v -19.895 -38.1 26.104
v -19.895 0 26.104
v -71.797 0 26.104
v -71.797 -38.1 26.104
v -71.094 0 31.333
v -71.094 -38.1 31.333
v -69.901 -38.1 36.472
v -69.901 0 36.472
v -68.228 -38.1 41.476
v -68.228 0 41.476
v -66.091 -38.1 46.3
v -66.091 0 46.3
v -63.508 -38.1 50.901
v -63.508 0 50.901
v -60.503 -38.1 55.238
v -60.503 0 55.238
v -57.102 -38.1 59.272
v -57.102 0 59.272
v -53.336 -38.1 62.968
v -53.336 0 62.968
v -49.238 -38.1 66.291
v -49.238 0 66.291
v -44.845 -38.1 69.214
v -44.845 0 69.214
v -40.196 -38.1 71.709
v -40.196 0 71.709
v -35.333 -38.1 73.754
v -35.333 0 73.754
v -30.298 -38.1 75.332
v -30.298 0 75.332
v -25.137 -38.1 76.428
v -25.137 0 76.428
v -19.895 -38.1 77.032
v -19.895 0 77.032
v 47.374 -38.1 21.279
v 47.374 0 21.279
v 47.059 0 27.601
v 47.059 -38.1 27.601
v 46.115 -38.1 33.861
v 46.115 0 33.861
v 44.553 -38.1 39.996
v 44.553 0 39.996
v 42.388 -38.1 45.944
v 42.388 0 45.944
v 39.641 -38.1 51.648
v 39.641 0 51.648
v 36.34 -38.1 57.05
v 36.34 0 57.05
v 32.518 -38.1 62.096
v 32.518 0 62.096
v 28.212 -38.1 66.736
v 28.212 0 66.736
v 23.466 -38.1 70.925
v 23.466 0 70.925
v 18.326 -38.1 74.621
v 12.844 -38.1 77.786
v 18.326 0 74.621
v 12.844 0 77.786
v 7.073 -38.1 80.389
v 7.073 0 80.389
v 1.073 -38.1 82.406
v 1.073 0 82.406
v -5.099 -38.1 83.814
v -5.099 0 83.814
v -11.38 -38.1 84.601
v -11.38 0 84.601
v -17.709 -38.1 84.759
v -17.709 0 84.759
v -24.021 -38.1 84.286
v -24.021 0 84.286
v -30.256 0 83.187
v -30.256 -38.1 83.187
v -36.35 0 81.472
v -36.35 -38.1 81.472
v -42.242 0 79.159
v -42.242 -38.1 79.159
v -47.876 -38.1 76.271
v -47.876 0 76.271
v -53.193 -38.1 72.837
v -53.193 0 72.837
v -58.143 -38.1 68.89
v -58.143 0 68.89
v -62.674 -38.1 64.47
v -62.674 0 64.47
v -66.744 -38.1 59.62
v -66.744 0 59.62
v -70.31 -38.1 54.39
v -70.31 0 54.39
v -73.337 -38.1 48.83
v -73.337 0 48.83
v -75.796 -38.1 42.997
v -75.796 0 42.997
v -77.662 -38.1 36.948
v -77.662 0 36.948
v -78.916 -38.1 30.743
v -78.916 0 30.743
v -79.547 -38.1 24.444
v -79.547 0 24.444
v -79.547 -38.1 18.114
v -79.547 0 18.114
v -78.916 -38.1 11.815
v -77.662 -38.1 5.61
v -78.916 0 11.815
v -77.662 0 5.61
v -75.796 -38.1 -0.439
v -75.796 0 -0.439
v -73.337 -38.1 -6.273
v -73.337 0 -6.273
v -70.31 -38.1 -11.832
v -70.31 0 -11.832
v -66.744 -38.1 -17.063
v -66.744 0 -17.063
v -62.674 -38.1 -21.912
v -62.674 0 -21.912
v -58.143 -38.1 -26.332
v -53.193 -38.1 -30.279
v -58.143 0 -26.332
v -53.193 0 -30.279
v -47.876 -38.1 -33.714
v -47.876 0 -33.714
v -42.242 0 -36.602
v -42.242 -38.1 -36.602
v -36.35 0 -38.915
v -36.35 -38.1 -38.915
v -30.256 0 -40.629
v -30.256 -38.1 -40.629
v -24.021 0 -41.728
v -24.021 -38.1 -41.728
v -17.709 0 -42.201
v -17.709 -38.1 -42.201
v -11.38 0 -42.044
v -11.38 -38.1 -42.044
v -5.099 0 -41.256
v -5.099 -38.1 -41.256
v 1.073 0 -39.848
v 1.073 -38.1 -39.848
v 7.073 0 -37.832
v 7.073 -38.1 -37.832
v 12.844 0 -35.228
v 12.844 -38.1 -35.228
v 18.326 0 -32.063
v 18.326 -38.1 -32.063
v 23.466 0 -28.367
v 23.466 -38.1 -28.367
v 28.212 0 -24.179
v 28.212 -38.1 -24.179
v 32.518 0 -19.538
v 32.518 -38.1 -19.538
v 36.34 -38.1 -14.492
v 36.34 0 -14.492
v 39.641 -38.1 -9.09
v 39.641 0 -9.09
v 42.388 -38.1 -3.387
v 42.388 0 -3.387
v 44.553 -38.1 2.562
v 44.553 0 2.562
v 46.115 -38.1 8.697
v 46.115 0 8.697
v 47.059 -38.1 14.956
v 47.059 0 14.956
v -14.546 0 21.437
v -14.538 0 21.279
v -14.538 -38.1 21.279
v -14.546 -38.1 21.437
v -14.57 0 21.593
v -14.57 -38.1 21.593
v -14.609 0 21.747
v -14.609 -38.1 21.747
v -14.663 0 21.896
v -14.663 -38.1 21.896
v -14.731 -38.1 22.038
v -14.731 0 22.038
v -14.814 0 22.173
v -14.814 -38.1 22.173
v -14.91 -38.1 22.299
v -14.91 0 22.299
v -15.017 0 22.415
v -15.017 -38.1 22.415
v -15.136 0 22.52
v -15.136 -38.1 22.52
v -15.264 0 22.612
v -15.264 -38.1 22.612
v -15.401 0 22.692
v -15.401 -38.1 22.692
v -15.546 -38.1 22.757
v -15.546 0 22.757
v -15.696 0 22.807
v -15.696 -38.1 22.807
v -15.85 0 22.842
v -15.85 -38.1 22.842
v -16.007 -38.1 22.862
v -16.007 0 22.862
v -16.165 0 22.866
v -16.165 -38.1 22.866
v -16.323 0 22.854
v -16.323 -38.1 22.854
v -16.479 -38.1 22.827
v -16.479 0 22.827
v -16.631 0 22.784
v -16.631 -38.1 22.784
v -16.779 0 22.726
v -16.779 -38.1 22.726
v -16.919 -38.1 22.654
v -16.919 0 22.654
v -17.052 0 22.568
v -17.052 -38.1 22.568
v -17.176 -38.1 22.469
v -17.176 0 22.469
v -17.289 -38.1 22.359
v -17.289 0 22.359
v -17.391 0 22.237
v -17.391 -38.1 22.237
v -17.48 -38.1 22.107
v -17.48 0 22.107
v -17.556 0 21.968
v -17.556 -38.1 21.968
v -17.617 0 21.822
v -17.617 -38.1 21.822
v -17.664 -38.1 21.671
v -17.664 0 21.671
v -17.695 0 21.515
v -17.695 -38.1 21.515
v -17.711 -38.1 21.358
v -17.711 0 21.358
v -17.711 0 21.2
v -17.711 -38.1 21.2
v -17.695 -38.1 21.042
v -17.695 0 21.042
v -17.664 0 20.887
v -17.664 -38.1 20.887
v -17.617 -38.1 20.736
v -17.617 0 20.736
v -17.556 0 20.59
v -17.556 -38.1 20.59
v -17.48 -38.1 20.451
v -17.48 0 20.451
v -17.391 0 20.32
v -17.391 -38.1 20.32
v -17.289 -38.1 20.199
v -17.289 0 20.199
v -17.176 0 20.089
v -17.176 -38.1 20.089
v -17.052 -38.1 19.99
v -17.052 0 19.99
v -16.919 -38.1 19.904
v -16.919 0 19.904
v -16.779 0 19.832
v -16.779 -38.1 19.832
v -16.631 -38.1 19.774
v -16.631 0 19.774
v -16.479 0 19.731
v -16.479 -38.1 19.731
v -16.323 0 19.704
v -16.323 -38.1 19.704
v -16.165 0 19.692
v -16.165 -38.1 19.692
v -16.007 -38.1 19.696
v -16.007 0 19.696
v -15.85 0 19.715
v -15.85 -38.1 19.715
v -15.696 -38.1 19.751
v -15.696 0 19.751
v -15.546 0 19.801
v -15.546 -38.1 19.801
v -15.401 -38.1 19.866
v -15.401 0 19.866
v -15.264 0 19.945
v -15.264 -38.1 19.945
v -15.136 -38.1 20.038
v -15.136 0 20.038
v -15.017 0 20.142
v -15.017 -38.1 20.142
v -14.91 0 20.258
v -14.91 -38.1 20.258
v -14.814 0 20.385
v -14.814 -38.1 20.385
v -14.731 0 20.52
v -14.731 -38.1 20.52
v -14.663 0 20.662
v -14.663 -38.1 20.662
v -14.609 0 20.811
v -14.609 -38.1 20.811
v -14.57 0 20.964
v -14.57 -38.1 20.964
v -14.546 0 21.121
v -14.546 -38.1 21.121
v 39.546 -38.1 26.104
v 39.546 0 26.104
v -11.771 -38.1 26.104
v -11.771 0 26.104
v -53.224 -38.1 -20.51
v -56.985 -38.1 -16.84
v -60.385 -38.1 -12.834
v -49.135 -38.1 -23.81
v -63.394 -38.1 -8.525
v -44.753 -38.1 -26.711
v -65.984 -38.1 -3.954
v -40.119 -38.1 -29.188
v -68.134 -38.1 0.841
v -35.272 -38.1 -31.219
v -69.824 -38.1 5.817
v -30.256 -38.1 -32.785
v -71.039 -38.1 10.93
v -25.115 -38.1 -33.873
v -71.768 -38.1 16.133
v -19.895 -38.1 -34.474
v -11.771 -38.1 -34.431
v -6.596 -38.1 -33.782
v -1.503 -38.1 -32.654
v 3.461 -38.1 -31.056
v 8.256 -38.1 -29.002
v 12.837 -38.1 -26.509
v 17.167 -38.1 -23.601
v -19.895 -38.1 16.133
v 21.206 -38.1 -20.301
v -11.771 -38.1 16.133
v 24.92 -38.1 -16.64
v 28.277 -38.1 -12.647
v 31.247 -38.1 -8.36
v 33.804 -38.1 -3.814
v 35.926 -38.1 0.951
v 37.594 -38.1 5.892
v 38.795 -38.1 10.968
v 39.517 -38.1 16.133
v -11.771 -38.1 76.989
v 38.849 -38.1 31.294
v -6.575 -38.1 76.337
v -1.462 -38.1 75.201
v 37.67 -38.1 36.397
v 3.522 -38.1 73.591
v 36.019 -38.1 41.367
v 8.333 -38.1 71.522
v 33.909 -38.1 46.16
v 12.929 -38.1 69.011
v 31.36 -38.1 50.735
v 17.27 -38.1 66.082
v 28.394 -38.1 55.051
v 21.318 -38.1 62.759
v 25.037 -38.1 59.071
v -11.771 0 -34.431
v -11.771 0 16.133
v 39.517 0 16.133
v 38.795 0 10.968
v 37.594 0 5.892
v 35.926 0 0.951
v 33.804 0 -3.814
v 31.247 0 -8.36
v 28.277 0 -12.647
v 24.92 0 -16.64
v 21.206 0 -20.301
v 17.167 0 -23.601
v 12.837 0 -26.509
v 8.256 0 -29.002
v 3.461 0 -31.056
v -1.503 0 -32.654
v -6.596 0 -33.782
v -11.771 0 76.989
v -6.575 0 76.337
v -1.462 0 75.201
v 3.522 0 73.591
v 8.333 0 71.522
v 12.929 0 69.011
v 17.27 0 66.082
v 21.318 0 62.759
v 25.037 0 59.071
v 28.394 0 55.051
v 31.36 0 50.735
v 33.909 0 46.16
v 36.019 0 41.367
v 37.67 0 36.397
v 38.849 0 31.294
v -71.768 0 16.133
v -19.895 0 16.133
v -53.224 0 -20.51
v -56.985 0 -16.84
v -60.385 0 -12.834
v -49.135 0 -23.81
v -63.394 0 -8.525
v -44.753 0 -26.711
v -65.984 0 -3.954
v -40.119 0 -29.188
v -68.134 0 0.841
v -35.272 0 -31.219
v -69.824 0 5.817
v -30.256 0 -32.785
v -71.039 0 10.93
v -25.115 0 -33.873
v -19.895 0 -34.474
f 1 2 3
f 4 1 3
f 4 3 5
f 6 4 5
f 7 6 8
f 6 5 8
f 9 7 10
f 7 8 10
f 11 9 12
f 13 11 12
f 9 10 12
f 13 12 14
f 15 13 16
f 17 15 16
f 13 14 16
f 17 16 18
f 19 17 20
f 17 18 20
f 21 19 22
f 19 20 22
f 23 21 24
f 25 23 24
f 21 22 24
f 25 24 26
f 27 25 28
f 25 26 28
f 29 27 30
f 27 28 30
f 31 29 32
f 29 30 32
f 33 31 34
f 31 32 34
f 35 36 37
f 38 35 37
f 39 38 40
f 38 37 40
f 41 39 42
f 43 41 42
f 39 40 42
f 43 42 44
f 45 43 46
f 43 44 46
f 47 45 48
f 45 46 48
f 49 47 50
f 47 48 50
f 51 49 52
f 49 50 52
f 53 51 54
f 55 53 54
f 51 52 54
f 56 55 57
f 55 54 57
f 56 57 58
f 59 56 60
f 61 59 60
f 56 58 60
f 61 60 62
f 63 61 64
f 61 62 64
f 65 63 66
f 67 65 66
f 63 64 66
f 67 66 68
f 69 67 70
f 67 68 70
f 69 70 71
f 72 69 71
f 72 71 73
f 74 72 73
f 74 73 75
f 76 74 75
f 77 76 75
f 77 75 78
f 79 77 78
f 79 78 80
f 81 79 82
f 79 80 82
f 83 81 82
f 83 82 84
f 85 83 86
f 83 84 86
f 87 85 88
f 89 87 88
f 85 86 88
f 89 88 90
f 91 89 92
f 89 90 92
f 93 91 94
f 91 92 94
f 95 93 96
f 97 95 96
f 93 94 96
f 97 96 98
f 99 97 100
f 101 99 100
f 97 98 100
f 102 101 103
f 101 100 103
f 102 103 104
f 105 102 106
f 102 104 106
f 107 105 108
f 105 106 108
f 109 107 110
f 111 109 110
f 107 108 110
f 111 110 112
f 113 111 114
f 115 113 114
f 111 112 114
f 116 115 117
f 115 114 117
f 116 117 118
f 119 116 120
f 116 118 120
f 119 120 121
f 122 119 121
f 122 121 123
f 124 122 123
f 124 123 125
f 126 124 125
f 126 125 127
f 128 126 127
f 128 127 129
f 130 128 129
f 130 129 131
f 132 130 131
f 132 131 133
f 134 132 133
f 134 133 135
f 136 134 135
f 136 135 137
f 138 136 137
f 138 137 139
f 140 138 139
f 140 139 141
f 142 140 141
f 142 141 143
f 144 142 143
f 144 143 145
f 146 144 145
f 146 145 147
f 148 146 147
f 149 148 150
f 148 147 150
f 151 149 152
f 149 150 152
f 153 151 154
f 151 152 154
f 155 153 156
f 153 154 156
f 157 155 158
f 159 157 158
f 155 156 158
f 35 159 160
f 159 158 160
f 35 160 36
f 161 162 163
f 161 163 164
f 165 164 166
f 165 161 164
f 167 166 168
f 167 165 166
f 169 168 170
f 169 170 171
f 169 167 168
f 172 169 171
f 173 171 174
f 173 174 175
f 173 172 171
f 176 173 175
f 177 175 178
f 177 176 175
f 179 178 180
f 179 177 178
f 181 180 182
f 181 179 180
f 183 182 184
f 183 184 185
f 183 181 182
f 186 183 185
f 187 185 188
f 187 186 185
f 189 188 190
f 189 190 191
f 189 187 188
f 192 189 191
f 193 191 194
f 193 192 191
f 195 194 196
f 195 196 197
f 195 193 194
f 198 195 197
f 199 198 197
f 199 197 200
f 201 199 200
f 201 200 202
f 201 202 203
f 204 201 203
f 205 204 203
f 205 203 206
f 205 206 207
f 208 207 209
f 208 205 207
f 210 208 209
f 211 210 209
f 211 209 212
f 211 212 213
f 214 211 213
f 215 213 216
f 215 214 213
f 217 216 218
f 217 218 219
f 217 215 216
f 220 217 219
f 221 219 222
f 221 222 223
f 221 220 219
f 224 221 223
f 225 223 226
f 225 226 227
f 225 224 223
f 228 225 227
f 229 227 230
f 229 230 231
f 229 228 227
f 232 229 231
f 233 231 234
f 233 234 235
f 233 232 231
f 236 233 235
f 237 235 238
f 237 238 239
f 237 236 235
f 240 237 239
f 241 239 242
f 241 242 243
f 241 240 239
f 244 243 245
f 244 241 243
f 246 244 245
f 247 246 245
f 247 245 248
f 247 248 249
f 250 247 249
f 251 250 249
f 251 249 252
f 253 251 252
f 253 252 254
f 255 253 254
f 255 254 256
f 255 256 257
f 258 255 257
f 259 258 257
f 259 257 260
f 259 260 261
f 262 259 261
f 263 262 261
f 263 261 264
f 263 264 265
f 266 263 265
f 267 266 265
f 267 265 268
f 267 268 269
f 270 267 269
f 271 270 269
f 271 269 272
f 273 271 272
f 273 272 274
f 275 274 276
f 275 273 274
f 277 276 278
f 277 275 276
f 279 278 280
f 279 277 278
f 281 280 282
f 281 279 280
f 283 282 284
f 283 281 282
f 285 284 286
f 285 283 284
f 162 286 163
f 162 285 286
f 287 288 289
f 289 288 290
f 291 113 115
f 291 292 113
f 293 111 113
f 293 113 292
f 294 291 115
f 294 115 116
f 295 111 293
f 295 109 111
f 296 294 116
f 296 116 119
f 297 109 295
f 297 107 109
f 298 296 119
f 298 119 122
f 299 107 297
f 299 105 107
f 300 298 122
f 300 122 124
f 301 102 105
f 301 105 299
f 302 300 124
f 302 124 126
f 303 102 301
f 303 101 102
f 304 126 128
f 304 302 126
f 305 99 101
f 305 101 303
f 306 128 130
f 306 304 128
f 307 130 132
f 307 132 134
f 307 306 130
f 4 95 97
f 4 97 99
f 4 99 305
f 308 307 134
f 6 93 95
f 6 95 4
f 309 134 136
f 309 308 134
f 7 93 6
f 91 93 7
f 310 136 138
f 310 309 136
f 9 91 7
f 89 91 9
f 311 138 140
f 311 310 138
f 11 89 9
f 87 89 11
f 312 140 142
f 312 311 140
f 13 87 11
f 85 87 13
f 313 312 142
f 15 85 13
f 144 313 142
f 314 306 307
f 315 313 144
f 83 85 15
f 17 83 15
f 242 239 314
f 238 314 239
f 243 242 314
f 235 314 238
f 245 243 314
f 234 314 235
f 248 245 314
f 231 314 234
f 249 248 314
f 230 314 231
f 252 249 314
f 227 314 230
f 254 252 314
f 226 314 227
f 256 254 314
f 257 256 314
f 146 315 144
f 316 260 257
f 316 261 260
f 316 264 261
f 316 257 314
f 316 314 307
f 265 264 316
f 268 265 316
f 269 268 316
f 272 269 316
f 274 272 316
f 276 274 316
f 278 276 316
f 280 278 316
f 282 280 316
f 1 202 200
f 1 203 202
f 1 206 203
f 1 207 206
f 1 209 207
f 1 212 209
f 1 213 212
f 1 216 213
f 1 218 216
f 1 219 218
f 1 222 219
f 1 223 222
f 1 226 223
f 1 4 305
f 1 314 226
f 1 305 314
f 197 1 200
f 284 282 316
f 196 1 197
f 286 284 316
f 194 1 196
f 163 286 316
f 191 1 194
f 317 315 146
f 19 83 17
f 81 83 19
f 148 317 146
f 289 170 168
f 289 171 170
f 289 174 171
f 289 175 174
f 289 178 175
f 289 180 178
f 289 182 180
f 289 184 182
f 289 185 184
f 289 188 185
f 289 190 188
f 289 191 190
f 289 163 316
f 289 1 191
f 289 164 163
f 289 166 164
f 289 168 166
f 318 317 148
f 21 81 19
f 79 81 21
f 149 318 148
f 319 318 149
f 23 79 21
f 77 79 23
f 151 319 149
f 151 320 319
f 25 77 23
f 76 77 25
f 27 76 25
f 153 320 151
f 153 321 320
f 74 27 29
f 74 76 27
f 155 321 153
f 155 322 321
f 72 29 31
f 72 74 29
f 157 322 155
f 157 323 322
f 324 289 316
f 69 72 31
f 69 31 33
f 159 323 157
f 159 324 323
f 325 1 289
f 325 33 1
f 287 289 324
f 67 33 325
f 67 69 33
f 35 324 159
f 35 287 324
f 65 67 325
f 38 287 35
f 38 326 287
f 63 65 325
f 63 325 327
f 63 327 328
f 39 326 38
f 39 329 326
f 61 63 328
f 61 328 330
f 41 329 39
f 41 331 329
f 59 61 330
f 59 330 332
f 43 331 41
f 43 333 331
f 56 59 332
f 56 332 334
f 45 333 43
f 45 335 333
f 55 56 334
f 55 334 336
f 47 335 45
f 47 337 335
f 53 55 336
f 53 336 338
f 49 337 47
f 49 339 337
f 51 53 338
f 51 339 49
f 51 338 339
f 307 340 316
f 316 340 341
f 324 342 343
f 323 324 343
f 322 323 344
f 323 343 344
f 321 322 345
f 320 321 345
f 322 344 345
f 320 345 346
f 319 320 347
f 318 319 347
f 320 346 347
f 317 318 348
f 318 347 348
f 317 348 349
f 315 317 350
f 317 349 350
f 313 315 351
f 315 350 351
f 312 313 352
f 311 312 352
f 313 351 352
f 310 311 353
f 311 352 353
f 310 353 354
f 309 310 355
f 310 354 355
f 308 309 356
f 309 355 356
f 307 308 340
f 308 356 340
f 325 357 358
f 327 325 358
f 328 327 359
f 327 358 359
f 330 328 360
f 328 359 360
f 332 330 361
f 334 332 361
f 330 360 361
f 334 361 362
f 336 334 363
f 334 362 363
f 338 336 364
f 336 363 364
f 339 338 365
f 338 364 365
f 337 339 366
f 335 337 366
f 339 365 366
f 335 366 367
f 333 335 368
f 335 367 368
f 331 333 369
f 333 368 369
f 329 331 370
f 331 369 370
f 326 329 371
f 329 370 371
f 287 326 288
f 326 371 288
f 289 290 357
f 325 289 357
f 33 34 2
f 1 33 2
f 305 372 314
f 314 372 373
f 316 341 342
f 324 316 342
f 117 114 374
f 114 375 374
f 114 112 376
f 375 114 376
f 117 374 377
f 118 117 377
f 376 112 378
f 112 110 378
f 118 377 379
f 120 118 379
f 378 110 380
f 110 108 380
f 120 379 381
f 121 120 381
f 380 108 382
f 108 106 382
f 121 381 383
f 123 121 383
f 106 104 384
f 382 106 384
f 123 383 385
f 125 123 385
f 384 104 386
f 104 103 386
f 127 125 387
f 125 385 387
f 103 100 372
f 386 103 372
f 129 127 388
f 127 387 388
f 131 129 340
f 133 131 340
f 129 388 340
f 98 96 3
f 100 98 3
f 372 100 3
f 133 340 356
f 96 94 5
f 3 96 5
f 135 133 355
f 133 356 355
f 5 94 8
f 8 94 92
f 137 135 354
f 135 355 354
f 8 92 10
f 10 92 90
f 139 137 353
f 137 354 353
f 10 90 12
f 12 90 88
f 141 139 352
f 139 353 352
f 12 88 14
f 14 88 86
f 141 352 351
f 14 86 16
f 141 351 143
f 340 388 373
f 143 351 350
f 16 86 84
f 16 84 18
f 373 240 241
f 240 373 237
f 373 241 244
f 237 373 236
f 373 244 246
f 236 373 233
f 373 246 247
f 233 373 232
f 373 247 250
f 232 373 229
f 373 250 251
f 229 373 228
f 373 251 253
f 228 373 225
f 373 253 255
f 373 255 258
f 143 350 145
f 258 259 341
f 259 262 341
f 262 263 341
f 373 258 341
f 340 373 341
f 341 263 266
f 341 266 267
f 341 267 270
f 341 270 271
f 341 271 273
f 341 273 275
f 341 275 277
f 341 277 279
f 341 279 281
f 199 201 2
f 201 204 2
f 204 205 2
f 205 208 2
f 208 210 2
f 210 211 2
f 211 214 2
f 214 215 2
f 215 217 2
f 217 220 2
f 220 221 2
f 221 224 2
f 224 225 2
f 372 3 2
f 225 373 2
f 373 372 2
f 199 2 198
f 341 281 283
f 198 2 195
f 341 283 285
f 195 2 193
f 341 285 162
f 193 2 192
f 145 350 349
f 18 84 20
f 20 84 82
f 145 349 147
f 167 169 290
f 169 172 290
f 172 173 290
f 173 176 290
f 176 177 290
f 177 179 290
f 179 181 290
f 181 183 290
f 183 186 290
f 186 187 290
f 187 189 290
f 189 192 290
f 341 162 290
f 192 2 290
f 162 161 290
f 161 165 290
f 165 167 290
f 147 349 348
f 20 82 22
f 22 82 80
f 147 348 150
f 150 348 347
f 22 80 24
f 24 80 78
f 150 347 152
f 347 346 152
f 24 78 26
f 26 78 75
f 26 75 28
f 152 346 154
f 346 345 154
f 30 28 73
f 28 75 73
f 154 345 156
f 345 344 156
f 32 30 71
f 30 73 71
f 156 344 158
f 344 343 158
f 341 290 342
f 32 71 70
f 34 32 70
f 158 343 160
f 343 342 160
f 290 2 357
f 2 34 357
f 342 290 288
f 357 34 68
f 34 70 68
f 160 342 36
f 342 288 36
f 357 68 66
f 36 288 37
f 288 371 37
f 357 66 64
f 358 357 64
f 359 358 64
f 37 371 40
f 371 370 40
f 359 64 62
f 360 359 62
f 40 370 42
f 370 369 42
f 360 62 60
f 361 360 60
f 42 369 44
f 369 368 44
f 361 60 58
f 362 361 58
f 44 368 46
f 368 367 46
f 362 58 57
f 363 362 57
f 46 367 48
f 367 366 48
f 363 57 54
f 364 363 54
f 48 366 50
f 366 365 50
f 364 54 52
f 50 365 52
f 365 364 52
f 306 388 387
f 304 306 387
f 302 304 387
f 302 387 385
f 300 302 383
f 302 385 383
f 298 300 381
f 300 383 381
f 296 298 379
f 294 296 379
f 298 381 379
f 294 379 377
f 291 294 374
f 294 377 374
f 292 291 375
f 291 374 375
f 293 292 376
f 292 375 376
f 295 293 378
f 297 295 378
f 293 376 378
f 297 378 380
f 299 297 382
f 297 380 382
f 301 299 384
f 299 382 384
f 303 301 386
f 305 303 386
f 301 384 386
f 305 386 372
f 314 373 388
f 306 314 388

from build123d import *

# Parameters (mm, degrees)
F0_R     = 63.5
F0_R_2   = 1.5875
F1_DEPTH = 38.1


with BuildPart() as f1:
    # F0 (on Front) → F1 (new body)
    with BuildSketch(Plane.XZ):
        with Locations((-16.125669, 21.278876)):
            Circle(F0_R)
        with BuildLine():
            ThreePointArc((-19.895006, -34.47385), (-55.147708, -18.71931), (-71.768271, 16.133457))
            Line((-71.768271, 16.133457), (-19.895006, 16.133457))
            Line((-19.895006, 16.133457), (-19.895006, -34.47385))
        make_face(mode=Mode.SUBTRACT)
        with BuildLine():
            Line((-11.770886, -34.431179), (-11.770886, 16.133457))
            Line((-11.770886, 16.133457), (39.516932, 16.133457))
            ThreePointArc((39.516932, 16.133457), (23.105914, -18.513802), (-11.770886, -34.431179))
        make_face(mode=Mode.SUBTRACT)
        with BuildLine():
            ThreePointArc((-71.796996, 26.103588), (-55.262784, 61.16447), (-19.895006, 77.031602))
            Line((-19.895006, 77.031602), (-19.895006, 26.103588))
            Line((-19.895006, 26.103588), (-71.796996, 26.103588))
        make_face(mode=Mode.SUBTRACT)
        with Locations((-16.125669, 21.278876)):
            Circle(F0_R_2, mode=Mode.SUBTRACT)
        with BuildLine():
            Line((-11.770886, 26.103588), (-11.770886, 76.988931))
            ThreePointArc((-11.770886, 76.988931), (23.220398, 60.958359), (39.545657, 26.103588))
            Line((39.545657, 26.103588), (-11.770886, 26.103588))
        make_face(mode=Mode.SUBTRACT)
    extrude(amount=F1_DEPTH)


solid = f1.part
